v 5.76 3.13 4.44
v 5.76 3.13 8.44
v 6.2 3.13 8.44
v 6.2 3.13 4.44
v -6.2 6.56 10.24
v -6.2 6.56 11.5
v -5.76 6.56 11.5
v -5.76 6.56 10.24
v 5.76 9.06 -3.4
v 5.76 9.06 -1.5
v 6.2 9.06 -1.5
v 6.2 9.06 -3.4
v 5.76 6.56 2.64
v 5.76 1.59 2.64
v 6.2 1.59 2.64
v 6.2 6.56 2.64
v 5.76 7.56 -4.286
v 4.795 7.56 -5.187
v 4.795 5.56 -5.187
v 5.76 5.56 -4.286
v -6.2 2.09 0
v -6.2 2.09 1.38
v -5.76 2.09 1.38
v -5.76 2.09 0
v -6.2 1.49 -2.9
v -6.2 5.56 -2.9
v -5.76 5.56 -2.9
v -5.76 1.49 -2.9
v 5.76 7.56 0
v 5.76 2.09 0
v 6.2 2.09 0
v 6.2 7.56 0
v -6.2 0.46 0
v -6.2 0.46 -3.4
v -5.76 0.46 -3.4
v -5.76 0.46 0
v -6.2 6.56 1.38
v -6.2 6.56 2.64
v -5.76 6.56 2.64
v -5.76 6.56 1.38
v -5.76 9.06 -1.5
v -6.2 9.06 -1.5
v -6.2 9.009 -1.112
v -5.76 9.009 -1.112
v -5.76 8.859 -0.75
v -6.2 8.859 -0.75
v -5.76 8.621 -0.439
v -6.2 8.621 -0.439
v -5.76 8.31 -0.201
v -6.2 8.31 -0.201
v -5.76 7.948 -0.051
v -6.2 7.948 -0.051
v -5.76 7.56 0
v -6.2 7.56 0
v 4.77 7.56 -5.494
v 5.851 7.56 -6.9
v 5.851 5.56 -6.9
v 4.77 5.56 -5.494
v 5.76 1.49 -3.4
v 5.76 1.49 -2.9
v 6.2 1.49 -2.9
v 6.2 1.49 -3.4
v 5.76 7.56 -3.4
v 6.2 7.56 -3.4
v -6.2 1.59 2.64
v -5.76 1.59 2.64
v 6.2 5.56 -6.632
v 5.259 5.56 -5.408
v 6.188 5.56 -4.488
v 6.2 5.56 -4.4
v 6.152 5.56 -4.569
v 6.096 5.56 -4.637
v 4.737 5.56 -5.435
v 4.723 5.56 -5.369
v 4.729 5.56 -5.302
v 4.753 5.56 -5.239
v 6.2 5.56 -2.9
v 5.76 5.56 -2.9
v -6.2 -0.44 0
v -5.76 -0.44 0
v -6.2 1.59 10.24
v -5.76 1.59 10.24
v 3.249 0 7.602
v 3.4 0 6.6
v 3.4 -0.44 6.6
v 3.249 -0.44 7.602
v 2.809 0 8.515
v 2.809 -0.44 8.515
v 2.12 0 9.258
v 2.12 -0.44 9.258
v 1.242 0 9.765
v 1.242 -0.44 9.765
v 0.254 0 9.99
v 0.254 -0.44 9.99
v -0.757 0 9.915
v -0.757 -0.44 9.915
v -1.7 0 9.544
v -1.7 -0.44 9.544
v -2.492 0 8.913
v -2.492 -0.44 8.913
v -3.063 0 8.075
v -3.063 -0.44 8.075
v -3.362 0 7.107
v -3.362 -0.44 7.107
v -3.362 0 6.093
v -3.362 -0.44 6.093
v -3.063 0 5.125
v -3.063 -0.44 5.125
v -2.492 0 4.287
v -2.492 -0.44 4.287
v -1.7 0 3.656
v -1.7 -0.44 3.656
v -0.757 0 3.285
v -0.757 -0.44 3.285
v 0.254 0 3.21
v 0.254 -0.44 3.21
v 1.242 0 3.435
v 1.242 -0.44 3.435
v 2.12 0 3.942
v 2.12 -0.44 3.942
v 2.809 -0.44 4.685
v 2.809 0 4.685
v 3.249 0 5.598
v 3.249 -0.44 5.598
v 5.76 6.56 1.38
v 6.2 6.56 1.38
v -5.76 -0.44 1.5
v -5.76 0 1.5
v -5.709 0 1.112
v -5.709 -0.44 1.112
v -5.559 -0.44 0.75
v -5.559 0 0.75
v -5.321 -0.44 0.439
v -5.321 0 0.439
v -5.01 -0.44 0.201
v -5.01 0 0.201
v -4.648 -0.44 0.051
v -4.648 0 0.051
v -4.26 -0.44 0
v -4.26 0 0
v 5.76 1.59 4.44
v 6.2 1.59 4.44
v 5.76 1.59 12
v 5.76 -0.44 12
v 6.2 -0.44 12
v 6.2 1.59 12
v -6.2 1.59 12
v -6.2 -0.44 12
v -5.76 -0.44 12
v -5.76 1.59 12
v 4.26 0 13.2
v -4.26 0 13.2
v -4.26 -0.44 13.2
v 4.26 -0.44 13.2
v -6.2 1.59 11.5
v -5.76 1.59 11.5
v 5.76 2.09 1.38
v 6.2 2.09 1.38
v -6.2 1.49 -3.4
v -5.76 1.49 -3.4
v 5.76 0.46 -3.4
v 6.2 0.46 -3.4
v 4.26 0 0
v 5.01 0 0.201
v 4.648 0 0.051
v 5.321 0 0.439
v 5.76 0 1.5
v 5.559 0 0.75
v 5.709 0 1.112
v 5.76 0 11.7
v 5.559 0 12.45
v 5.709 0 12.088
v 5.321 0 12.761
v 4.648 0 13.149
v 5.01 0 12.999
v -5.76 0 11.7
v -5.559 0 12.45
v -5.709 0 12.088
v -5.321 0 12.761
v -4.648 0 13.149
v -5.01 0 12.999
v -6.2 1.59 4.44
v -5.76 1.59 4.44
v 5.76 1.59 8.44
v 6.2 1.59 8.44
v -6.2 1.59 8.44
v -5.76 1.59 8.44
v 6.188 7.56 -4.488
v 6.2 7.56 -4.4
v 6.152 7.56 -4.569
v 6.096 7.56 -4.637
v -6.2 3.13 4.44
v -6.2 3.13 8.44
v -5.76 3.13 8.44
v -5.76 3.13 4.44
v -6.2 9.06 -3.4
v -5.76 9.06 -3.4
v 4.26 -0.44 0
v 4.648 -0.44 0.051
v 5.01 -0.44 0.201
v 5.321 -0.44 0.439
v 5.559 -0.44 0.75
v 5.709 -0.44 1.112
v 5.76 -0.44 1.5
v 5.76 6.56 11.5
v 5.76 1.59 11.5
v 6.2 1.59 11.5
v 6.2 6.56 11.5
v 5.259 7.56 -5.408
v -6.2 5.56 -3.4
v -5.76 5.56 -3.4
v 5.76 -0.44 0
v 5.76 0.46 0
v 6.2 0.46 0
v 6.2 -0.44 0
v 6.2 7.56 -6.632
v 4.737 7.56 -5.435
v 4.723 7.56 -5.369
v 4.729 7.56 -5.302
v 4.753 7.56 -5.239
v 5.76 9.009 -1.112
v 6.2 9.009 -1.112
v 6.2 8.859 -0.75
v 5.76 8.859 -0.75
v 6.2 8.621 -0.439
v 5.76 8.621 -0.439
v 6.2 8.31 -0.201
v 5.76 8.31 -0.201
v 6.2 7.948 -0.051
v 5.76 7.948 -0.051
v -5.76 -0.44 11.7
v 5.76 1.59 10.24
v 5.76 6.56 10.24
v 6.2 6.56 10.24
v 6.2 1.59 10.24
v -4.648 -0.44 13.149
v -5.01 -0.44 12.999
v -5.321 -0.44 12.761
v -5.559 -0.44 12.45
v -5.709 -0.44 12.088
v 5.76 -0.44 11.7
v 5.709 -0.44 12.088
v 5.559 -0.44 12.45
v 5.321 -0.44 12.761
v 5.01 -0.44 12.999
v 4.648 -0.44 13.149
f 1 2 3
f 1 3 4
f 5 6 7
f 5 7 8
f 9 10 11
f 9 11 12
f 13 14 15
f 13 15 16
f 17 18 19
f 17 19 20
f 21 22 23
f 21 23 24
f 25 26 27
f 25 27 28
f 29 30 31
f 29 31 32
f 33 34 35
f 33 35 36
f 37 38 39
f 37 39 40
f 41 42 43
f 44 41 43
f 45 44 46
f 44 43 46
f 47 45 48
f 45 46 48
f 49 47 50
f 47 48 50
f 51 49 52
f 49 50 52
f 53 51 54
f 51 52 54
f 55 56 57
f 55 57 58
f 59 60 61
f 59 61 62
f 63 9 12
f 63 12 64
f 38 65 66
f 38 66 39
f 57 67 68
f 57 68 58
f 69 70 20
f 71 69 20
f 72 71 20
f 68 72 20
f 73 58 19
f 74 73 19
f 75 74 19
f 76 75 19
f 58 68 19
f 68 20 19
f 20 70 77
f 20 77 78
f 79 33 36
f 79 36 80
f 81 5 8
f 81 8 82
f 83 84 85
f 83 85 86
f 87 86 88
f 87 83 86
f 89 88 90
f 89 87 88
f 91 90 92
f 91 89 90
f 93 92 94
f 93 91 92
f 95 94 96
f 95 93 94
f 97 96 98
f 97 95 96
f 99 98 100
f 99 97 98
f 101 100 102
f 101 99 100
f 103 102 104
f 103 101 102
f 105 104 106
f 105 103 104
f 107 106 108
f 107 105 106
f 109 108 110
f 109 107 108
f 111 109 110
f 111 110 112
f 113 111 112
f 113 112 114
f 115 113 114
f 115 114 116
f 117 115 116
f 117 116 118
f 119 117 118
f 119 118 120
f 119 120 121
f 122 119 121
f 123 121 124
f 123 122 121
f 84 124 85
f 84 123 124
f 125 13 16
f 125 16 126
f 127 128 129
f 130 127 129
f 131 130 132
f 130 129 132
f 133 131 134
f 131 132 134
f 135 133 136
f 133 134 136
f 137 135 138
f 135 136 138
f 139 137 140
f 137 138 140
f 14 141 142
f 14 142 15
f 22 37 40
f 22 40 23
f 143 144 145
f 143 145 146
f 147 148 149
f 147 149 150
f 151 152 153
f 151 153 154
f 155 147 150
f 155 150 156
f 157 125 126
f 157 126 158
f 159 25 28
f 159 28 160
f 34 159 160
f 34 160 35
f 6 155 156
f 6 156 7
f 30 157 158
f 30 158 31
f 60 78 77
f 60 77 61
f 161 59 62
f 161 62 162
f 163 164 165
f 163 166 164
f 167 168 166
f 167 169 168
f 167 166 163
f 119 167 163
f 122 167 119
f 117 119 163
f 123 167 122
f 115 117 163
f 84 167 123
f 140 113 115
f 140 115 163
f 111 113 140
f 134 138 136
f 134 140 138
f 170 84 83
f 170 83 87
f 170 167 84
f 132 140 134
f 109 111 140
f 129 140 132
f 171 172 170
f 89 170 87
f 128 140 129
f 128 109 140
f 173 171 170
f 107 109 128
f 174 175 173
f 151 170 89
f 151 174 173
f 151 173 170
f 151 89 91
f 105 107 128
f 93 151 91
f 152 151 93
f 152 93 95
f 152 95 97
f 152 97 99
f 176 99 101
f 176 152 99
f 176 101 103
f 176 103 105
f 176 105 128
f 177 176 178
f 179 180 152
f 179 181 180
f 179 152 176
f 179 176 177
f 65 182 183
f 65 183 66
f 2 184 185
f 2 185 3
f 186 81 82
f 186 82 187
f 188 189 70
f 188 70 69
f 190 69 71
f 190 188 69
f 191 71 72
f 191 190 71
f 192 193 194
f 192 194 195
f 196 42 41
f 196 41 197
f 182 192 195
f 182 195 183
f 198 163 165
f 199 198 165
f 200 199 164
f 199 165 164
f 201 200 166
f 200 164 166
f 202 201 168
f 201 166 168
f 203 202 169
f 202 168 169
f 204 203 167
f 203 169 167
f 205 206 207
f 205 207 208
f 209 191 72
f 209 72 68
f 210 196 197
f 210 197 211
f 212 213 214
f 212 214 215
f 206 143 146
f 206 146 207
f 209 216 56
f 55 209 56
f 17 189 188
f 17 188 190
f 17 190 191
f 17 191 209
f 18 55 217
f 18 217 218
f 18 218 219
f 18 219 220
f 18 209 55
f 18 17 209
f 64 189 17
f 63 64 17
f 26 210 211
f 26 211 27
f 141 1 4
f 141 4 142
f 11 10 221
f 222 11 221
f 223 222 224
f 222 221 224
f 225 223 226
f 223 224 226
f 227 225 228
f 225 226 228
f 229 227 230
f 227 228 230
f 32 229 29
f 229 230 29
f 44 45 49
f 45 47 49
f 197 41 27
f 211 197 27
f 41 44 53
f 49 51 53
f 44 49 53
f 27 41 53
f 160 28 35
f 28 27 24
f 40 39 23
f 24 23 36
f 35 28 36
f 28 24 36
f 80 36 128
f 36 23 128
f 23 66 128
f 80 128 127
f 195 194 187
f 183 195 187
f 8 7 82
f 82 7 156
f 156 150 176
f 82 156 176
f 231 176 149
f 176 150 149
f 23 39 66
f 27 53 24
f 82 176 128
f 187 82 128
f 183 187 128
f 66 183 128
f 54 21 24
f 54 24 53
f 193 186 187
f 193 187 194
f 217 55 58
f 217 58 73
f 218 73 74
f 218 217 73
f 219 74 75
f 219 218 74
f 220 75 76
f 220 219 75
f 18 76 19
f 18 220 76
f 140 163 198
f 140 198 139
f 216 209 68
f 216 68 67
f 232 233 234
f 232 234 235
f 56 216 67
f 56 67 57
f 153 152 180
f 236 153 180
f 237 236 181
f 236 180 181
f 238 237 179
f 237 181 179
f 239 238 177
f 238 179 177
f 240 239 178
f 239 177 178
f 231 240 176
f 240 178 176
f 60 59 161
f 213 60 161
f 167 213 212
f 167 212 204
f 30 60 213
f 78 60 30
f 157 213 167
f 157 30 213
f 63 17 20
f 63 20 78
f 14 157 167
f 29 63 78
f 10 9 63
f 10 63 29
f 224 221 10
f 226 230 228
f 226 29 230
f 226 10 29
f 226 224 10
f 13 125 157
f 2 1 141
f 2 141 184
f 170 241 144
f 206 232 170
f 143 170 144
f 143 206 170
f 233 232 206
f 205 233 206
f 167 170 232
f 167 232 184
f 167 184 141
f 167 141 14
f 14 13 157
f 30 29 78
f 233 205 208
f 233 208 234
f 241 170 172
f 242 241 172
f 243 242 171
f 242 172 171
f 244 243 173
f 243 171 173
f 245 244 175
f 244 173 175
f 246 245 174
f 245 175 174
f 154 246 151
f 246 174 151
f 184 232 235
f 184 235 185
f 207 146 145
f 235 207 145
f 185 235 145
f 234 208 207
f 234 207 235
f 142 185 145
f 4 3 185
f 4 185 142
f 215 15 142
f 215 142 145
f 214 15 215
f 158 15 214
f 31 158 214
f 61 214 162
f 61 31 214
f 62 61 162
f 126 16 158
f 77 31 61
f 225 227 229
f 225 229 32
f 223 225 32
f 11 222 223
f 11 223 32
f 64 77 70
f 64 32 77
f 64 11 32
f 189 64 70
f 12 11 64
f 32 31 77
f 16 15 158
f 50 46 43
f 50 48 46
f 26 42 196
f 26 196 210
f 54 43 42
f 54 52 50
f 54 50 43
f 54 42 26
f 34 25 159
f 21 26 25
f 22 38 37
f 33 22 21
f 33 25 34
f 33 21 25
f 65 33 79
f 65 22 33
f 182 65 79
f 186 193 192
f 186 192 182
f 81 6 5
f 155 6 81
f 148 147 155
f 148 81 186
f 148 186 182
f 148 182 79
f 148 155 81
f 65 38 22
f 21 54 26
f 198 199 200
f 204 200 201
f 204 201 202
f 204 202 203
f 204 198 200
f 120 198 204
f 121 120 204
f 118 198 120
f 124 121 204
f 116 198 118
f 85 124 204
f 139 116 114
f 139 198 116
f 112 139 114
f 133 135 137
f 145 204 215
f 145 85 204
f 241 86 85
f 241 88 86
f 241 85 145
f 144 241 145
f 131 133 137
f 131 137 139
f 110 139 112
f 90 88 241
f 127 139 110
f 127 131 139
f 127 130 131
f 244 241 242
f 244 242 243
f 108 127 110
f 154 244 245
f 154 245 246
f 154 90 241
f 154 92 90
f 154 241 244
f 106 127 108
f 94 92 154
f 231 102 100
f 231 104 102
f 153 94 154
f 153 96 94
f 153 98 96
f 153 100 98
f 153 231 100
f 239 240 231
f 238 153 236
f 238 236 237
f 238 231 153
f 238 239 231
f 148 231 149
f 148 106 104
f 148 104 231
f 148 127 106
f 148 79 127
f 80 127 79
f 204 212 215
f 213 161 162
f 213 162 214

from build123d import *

# Parameters (mm, degrees)
EXTRUDE003_DEPTH = 2
EXTRUDE001_DEPTH = 0.44
EXTRUDE_DEPTH    = 0.44
SKETCH027_R      = 3.4
EXTRUDE002_DEPTH = 0.44


with BuildPart() as extrude003:
    # Sketch028 → Extrude003 (new body)
    with BuildSketch(Plane.XZ):
        with BuildLine():
            Line((0, 0), (0, -1))
            ThreePointArc((0, -1), (0.027181, -1.129591), (0.104142, -1.237338))
            Line((0.104142, -1.237338), (0.941285, -2.007596))
            Line((0.941285, -2.007596), (0, -3.231801))
            Line((0, -3.231801), (0.348811, -3.5))
            Line((0.348811, -3.5), (1.43, -2.093841))
            ThreePointArc((1.43, -2.093841), (1.476737, -1.935298), (1.404702, -1.786533))
            Line((1.404702, -1.786533), (0.44, -0.885948))
            Line((0.44, -0.885948), (0.44, 0))
            Line((0.44, 0), (0, 0))
        make_face()
    extrude(amount=EXTRUDE003_DEPTH)


with BuildPart() as extrude003_1:
    # Extrude003 placement: moved
    add(extrude003.part.moved(Location((-6.2, 7.56, -3.4))))


with BuildPart() as part_mirroring:
    # Part__Mirroring: instance of Extrude003
    add(extrude003_1.part.mirror(Plane(origin=(0, 0, 0), x_dir=(0, -1, 0), z_dir=(1, 0, 0))))


with BuildPart() as extrude001:
    # Sketch026 → Extrude001 (new body)
    with BuildSketch(Plane.YZ):
        with BuildLine():
            Line((0, 12), (2.03, 12))
            Line((2.03, 12), (2.03, 11.5))
            Line((2.03, 11.5), (7, 11.5))
            Line((7, 11.5), (7, 10.24))
            Line((7, 10.24), (2.03, 10.24))
            Line((2.03, 10.24), (2.03, 8.44))
            Line((2.03, 8.44), (3.57, 8.44))
            Line((3.57, 8.44), (3.57, 4.44))
            Line((3.57, 4.44), (2.03, 4.44))
            Line((2.03, 4.44), (2.03, 2.64))
            Line((2.03, 2.64), (7, 2.64))
            Line((7, 2.64), (7, 1.38))
            Line((7, 1.38), (2.53, 1.38))
            Line((2.53, 1.38), (2.53, 0))
            Line((2.53, 0), (8, 0))
            ThreePointArc((9.5, -1.5), (9.06066, -0.43934), (8, 0))
            Line((9.5, -1.5), (9.5, -3.4))
            Line((9.5, -3.4), (6, -3.4))
            Line((6, -3.4), (6, -2.9))
            Line((6, -2.9), (1.93, -2.9))
            Line((1.93, -2.9), (1.93, -3.4))
            Line((1.93, -3.4), (0.9, -3.4))
            Line((0.9, -3.4), (0.9, 0))
            Line((0.9, 0), (0, 0))
            Line((0, 0), (0, 12))
        make_face()
    extrude(amount=EXTRUDE001_DEPTH)


with BuildPart() as extrude001_1:
    # Extrude001 placement: moved
    add(extrude001.part.moved(Location((5.76, -0.44, 0))))


with BuildPart() as fusion:
    # Sketch026 → Extrude (new body)
    with BuildSketch(Plane.YZ):
        with BuildLine():
            Line((0, 12), (2.03, 12))
            Line((2.03, 12), (2.03, 11.5))
            Line((2.03, 11.5), (7, 11.5))
            Line((7, 11.5), (7, 10.24))
            Line((7, 10.24), (2.03, 10.24))
            Line((2.03, 10.24), (2.03, 8.44))
            Line((2.03, 8.44), (3.57, 8.44))
            Line((3.57, 8.44), (3.57, 4.44))
            Line((3.57, 4.44), (2.03, 4.44))
            Line((2.03, 4.44), (2.03, 2.64))
            Line((2.03, 2.64), (7, 2.64))
            Line((7, 2.64), (7, 1.38))
            Line((7, 1.38), (2.53, 1.38))
            Line((2.53, 1.38), (2.53, 0))
            Line((2.53, 0), (8, 0))
            ThreePointArc((9.5, -1.5), (9.06066, -0.43934), (8, 0))
            Line((9.5, -1.5), (9.5, -3.4))
            Line((9.5, -3.4), (6, -3.4))
            Line((6, -3.4), (6, -2.9))
            Line((6, -2.9), (1.93, -2.9))
            Line((1.93, -2.9), (1.93, -3.4))
            Line((1.93, -3.4), (0.9, -3.4))
            Line((0.9, -3.4), (0.9, 0))
            Line((0.9, 0), (0, 0))
            Line((0, 0), (0, 12))
        make_face()
    extrude(amount=EXTRUDE_DEPTH)


with BuildPart() as fusion_1:
    # Extrude placement: moved
    add(fusion.part.moved(Location((-6.2, -0.44, 0))))

    # Fusion: union Extrude001
    add(extrude001_1.part)


with BuildPart() as metalcover:
    # Sketch027 → Extrude002 (new body)
    with BuildSketch(Plane.XZ):
        with BuildLine():
            Line((1.94, 13.2), (10.46, 13.2))
            ThreePointArc((11.96, 11.7), (11.52066, 12.76066), (10.46, 13.2))
            Line((11.96, 11.7), (11.96, 1.5))
            ThreePointArc((10.46, 0), (11.52066, 0.43934), (11.96, 1.5))
            Line((10.46, 0), (1.94, 0))
            ThreePointArc((0.44, 1.5), (0.87934, 0.43934), (1.94, 0))
            Line((0.44, 1.5), (0.44, 11.7))
            ThreePointArc((1.94, 13.2), (0.87934, 12.76066), (0.44, 11.7))
        make_face()
        with Locations((6.2, 6.6)):
            Circle(SKETCH027_R, mode=Mode.SUBTRACT)
    extrude(amount=EXTRUDE002_DEPTH)


with BuildPart() as metalcover_1:
    # Extrude002 placement: moved
    add(metalcover.part.moved(Location((-6.2, 0, 0))))

    # Fusion001: union Fusion
    add(fusion_1.part)

    # Fusion004: union Part__Mirroring
    add(part_mirroring.part)


solid = metalcover_1.part
